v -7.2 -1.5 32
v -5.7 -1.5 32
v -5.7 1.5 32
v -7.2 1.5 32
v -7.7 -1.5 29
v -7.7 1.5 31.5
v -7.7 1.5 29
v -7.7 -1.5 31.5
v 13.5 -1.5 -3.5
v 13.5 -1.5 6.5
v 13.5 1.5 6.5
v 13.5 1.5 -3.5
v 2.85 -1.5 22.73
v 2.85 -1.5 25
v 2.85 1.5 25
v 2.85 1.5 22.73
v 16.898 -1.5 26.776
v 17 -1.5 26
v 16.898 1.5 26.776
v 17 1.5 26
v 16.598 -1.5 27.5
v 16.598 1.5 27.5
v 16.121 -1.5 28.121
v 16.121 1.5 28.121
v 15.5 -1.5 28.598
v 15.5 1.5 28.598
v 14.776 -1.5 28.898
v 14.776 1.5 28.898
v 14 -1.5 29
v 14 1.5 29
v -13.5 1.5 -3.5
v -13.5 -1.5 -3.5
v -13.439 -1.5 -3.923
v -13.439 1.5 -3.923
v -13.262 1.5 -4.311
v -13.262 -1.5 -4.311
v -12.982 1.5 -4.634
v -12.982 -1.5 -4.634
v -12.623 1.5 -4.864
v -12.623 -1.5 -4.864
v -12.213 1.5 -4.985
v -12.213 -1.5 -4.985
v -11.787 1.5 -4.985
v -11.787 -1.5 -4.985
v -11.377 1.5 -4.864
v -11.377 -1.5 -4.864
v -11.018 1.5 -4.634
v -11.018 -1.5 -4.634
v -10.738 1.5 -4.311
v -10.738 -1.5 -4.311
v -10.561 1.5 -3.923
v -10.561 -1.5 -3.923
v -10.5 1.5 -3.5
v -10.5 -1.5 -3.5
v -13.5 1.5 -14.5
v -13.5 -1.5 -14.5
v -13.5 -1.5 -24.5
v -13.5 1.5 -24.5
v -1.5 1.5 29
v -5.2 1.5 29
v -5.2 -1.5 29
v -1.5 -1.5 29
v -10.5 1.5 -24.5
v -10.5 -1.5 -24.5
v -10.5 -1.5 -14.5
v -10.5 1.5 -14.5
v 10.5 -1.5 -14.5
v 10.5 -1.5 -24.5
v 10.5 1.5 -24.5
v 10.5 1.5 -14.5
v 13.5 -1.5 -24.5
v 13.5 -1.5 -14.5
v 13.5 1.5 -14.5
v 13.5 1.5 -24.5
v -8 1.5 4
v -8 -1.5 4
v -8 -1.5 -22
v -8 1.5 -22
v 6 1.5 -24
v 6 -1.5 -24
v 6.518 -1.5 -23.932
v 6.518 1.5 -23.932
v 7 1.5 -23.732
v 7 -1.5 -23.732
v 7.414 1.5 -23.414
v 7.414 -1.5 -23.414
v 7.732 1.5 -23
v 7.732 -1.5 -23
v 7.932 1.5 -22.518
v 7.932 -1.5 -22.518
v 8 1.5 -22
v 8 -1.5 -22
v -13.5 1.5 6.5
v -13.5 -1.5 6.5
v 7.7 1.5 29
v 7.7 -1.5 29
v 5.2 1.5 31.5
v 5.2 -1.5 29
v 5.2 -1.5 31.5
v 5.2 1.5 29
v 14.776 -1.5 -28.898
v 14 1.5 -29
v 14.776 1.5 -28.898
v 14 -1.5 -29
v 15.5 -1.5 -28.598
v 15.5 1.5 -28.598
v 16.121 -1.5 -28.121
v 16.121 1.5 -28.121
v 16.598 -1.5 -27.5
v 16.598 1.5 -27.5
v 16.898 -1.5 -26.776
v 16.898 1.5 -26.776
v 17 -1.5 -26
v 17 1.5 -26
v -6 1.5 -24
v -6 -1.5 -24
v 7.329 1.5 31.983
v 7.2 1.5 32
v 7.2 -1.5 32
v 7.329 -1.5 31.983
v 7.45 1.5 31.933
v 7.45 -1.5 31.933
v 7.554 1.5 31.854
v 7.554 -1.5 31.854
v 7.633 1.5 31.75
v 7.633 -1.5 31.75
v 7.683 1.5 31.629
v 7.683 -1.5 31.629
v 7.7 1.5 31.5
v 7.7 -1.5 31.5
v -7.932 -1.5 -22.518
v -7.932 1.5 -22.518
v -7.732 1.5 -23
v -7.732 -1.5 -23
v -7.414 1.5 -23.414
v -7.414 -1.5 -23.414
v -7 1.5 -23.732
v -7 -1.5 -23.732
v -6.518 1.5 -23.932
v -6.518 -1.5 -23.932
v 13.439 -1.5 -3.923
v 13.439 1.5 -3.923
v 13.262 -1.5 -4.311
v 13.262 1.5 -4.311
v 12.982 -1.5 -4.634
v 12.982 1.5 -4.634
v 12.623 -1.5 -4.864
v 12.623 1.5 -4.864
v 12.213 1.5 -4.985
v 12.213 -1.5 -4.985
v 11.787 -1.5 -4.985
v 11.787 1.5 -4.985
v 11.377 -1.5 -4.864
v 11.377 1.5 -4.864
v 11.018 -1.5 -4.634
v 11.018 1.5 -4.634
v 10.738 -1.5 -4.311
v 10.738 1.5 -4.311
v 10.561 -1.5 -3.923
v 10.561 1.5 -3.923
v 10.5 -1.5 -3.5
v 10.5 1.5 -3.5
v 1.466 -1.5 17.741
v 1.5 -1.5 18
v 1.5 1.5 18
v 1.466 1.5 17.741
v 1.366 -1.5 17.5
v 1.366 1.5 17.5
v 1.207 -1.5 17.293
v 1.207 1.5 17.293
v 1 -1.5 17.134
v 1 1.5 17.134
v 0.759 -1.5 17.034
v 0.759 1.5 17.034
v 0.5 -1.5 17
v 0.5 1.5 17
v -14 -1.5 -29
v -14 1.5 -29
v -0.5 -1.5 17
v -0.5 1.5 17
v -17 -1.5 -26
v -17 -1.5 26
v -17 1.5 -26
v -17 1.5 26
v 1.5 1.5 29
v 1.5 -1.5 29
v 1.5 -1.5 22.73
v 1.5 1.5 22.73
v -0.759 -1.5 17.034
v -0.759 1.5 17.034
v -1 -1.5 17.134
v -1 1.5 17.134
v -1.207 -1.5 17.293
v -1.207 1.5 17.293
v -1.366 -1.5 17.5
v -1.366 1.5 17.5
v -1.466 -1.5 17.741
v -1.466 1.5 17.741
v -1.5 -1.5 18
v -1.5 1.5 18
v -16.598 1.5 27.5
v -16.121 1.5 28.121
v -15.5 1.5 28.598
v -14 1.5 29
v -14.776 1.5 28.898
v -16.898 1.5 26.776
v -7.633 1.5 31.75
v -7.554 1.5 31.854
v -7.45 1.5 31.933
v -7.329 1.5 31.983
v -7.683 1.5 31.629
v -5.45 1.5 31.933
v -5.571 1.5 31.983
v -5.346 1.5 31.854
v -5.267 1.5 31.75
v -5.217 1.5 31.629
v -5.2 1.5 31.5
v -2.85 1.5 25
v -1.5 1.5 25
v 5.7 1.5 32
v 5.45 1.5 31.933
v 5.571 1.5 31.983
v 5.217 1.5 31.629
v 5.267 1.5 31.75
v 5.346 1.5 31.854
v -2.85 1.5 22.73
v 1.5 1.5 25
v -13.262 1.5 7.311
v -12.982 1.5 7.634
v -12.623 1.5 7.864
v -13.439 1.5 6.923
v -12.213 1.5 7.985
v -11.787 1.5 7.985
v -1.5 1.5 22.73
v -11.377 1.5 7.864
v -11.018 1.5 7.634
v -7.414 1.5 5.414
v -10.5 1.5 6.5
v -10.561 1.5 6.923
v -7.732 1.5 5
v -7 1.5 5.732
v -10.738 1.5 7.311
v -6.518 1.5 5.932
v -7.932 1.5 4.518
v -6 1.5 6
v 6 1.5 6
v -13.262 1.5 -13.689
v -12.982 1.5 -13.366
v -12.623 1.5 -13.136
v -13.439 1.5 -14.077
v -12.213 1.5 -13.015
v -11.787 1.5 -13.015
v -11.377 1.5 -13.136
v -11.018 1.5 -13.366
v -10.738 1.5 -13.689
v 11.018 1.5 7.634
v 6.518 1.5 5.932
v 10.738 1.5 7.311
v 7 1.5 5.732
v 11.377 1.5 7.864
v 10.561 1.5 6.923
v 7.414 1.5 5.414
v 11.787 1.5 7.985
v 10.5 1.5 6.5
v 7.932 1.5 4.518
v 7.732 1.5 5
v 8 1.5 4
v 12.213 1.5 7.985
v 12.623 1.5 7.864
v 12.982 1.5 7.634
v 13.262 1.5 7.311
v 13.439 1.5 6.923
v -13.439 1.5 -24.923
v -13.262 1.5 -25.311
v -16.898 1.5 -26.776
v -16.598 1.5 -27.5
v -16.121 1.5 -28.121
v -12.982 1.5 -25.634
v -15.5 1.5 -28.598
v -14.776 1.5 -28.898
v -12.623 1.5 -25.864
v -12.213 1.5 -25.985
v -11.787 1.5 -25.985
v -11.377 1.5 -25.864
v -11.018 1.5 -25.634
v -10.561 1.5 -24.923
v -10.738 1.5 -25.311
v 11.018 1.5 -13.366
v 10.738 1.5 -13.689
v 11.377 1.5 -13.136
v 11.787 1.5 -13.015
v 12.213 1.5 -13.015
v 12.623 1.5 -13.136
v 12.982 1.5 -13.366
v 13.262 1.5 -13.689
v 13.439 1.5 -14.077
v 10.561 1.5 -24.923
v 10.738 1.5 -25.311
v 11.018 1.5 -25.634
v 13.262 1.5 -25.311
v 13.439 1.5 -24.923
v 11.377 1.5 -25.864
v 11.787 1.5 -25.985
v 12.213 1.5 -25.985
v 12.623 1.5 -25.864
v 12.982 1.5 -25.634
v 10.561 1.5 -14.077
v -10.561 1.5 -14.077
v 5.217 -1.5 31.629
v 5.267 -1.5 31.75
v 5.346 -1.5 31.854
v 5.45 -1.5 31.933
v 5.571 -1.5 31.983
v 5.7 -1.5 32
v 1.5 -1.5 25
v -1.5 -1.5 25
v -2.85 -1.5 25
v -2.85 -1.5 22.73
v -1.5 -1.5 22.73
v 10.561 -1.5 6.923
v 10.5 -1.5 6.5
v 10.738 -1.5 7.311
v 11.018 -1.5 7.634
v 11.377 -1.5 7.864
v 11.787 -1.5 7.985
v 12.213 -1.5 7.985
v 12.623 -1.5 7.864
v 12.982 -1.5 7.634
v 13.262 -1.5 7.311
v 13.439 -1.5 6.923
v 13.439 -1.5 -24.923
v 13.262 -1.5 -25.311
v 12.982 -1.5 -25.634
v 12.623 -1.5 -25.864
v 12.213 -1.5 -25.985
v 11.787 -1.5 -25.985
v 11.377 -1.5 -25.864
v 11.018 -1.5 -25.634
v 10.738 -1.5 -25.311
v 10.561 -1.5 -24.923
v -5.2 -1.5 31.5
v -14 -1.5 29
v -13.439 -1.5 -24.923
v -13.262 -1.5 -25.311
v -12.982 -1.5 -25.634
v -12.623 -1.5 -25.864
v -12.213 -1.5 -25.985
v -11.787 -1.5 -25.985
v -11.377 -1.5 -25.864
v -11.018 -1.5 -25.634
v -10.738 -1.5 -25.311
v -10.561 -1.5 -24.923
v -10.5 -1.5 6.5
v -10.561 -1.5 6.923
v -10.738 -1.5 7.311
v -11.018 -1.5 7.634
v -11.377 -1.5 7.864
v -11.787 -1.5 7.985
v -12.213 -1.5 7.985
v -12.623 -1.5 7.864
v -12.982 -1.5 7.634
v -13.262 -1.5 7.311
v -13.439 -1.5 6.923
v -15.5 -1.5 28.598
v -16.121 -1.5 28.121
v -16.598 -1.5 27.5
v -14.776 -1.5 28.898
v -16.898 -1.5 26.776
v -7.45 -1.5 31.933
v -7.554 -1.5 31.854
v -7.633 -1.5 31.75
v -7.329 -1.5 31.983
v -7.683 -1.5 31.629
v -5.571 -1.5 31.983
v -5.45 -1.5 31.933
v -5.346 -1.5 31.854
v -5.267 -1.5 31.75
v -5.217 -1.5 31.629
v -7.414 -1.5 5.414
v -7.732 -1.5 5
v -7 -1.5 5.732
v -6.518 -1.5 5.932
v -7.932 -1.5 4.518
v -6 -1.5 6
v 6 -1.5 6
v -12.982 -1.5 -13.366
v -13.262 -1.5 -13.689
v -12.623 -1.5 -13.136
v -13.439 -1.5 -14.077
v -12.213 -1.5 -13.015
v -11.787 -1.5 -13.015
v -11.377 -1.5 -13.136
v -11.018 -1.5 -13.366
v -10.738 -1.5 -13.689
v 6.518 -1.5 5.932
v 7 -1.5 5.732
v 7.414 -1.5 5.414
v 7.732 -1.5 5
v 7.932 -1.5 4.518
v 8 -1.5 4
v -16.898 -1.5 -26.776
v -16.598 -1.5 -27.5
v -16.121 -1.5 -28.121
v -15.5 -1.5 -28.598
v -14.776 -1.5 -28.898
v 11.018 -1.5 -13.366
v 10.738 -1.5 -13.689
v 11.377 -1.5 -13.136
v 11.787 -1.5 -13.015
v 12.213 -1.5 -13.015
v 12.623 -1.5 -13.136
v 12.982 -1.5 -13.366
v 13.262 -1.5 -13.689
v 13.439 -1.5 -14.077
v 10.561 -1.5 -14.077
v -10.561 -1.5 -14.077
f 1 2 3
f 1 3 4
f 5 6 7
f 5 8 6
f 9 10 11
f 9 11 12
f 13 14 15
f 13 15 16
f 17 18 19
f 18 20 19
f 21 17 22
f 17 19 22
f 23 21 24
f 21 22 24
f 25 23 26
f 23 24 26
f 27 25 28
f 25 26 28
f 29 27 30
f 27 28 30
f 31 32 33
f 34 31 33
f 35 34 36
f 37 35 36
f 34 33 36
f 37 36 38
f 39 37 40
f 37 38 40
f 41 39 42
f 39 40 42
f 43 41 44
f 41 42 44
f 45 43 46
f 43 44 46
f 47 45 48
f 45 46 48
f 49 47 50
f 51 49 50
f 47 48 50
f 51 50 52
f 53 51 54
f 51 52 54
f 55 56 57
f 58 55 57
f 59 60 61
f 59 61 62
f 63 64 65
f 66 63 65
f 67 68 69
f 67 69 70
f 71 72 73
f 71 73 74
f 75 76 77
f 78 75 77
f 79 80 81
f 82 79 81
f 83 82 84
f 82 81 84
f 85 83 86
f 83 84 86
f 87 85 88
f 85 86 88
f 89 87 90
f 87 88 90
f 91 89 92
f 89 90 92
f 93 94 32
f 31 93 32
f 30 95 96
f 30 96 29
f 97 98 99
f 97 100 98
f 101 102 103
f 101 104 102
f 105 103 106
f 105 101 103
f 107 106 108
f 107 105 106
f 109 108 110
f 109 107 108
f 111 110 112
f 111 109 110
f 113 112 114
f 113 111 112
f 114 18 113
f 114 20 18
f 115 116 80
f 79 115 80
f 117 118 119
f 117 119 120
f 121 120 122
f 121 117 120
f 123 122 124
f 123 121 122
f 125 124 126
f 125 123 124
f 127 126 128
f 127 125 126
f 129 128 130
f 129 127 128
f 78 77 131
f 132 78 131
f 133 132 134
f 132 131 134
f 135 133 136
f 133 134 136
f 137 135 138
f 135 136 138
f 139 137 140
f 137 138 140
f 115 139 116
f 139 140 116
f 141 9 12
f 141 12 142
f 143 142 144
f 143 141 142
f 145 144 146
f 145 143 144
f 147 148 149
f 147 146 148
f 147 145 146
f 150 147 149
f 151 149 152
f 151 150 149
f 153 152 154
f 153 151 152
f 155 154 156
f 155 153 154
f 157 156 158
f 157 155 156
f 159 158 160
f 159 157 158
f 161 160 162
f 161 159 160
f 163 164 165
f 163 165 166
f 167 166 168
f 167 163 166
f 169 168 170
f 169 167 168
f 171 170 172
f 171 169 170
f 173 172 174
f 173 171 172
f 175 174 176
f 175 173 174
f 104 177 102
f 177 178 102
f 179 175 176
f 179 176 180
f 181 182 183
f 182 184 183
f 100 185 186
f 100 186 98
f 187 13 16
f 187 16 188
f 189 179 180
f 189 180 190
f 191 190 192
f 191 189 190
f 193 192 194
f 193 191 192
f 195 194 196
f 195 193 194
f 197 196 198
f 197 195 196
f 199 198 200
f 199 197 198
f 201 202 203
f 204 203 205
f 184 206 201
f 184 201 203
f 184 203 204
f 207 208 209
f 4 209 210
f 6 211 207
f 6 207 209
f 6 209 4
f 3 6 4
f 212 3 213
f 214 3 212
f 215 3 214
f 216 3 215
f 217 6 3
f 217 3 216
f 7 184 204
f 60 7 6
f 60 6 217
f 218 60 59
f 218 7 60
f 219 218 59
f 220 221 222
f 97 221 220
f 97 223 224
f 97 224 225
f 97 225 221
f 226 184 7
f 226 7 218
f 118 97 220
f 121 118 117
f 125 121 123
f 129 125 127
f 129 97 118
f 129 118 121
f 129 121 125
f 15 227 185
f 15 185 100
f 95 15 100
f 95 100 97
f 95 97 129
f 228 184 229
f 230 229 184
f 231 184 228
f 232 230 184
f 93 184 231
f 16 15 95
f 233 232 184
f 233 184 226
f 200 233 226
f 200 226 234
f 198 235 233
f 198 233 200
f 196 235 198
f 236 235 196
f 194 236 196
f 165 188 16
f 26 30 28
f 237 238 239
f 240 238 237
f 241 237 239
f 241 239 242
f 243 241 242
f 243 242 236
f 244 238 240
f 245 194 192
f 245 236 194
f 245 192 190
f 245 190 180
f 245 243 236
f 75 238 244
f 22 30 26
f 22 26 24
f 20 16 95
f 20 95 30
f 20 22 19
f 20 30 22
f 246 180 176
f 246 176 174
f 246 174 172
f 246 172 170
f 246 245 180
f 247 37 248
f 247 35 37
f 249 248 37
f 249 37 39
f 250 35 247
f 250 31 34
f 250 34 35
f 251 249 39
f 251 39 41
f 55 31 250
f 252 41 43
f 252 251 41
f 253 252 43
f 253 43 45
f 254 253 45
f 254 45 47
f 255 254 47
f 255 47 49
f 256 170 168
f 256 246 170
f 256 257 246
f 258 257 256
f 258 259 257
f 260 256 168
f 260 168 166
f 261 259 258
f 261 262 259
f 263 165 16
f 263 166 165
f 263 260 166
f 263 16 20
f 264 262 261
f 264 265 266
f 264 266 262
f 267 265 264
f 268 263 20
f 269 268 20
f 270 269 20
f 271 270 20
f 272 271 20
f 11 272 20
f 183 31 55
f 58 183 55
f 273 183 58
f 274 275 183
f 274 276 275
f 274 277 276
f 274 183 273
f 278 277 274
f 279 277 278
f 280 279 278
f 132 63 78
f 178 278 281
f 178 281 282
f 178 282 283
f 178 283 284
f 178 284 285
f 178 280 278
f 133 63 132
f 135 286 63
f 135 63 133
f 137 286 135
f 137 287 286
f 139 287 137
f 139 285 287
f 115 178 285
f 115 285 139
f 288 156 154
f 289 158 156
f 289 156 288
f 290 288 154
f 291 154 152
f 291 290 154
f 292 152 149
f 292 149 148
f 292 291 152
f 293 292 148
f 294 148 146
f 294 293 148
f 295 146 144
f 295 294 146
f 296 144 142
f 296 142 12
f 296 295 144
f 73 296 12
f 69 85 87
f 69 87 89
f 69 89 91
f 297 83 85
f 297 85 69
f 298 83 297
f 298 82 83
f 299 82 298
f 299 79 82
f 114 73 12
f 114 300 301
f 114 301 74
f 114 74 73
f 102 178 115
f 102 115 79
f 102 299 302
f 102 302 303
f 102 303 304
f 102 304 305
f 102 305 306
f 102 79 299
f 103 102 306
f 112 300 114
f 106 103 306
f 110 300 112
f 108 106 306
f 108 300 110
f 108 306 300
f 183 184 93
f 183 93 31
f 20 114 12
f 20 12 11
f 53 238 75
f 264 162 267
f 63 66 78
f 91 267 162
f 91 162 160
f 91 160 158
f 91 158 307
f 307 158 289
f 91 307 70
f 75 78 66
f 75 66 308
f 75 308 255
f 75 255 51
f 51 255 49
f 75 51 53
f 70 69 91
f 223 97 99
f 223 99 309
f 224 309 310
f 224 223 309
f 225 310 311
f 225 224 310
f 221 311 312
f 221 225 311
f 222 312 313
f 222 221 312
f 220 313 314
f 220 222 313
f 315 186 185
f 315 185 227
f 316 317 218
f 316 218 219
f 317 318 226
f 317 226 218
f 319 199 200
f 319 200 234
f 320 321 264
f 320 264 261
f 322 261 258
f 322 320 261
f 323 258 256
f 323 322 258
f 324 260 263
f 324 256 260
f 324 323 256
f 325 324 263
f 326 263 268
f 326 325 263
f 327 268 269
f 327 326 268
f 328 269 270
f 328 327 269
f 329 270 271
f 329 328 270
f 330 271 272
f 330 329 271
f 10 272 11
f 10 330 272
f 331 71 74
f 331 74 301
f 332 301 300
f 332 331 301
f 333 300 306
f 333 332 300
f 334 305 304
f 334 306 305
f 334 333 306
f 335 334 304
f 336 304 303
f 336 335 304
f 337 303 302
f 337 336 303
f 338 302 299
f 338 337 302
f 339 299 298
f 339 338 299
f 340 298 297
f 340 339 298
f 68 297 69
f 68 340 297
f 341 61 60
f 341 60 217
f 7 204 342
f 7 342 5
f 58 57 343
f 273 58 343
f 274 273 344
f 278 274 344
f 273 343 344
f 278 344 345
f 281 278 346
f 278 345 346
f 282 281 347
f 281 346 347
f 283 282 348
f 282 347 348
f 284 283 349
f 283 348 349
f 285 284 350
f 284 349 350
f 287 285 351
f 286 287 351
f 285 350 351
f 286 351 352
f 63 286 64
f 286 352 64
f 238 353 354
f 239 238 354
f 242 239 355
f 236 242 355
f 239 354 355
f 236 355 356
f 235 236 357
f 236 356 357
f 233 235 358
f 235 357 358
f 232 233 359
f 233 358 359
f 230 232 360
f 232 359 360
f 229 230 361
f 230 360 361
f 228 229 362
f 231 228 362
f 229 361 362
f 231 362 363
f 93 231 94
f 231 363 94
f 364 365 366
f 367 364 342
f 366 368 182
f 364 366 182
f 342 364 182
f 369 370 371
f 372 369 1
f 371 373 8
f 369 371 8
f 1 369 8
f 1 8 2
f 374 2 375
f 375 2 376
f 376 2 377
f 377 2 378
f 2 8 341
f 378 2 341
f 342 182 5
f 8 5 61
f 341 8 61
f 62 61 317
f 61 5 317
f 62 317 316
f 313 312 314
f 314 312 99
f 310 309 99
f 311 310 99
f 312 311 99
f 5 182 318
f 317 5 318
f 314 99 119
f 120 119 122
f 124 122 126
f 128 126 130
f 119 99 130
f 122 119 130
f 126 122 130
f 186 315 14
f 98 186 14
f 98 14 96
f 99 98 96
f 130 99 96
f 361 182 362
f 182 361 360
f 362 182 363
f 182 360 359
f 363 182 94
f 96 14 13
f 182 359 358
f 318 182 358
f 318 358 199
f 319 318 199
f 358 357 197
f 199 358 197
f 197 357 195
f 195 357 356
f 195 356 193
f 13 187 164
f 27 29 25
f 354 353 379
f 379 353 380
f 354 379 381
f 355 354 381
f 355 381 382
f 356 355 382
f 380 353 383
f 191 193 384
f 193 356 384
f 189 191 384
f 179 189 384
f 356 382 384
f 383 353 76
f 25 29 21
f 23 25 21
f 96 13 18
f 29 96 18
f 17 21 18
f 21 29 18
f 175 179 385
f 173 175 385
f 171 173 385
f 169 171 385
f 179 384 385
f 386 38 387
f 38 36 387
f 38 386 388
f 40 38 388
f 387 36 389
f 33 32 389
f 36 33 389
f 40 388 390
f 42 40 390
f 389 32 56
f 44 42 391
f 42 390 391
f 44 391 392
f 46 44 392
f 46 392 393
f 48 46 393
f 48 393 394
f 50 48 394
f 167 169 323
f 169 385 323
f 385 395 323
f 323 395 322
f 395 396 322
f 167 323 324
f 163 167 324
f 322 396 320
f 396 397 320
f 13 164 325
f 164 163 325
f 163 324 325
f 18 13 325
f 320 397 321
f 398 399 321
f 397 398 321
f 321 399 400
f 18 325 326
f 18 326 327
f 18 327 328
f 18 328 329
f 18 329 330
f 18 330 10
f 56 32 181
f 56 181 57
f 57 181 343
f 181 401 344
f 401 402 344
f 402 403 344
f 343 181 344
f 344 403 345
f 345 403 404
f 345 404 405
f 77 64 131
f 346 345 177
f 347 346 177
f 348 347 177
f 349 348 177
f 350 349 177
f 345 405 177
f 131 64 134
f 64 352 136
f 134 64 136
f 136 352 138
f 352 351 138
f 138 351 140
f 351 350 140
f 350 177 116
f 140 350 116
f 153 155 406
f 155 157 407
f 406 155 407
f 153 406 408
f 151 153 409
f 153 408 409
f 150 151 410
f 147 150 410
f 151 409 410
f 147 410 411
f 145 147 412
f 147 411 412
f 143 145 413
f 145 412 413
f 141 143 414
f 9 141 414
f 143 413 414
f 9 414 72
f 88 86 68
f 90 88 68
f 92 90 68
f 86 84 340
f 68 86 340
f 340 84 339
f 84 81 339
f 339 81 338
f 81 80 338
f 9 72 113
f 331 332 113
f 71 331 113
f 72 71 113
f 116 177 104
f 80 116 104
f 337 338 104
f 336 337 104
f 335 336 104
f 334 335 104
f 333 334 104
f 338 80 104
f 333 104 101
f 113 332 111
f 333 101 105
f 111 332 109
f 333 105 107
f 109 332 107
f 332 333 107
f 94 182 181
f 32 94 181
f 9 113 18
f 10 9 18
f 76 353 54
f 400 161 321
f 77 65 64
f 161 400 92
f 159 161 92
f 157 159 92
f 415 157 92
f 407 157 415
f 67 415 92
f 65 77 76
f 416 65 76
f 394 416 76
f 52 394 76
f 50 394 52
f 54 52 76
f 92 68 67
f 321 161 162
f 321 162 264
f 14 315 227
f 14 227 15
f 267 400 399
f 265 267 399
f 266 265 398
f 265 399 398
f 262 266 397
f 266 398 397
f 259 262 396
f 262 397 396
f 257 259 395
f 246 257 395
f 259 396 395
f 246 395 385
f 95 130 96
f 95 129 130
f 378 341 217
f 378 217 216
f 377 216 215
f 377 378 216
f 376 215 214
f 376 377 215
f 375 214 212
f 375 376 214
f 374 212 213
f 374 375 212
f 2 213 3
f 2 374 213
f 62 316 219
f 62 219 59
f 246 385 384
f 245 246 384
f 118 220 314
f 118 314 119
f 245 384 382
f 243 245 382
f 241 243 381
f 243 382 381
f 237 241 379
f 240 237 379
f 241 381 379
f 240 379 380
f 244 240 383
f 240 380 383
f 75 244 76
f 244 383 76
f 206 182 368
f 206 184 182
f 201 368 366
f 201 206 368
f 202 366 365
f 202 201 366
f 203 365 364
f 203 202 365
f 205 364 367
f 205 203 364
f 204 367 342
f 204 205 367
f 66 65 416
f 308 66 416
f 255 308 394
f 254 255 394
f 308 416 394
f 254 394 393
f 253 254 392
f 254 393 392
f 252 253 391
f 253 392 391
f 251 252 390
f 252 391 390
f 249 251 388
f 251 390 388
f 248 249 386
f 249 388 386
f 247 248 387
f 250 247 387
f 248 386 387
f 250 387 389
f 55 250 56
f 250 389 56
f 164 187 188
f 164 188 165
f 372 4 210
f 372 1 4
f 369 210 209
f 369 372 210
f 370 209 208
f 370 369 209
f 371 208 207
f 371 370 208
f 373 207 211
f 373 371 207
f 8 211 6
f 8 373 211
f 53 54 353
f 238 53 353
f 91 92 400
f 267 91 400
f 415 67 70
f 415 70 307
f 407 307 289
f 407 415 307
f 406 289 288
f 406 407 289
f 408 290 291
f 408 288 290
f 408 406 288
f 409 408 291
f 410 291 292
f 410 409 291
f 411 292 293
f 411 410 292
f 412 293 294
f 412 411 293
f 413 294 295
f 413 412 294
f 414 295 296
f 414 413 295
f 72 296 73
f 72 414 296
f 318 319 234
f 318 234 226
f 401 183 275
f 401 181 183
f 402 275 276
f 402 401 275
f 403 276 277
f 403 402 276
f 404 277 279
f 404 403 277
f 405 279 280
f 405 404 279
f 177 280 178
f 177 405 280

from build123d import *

# Parameters (mm, degrees)
SKETCH1_W               = 34
SKETCH1_H               = 58
BOSS_EXTRUDE1_DEPTH     = 1.5
CUT_EXTRUDE1_DEPTH      = 34.648922717
CUT_EXTRUDE1_DEPTH_BACK = 34.648922717
CUT_EXTRUDE2_DEPTH      = 34.648922717
CUT_EXTRUDE2_DEPTH_BACK = 34.648922717
BOSS_EXTRUDE3_DEPTH     = 1.5
FILLET1_R               = 3


with BuildPart() as part:
    # Sketch1 → Boss-Extrude1 (new, symmetric)
    with BuildSketch(Plane(origin=(0, 0, 0), x_dir=(1, 0, 0), z_dir=(0, 1, 0))):
        Rectangle(SKETCH1_W, SKETCH1_H)
    extrude(amount=BOSS_EXTRUDE1_DEPTH, both=True)

    # Sketch3 → Cut-Extrude1 (cut, two sides: drawn at the far end of the back side and taken through both)
    with BuildSketch(Plane(origin=(0, 0, 0), x_dir=(1, 0, 0), z_dir=(0, 1, 0)).offset(-CUT_EXTRUDE1_DEPTH_BACK)):
        with BuildLine():
            Line((-13.5, 14.5), (-13.5, 24.5))
            ThreePointArc((-13.5, 24.5), (-12, 26), (-10.5, 24.5))
            Line((-10.5, 24.5), (-10.5, 14.5))
            ThreePointArc((-10.5, 14.5), (-12, 13), (-13.5, 14.5))
        make_face()
        with BuildLine():
            Line((-13.5, -6.5), (-13.5, 3.5))
            ThreePointArc((-13.5, 3.5), (-12, 5), (-10.5, 3.5))
            Line((-10.5, 3.5), (-10.5, -6.5))
            ThreePointArc((-10.5, -6.5), (-12, -8), (-13.5, -6.5))
        make_face()
        with BuildLine():
            Line((13.5, -6.5), (13.5, 3.5))
            ThreePointArc((13.5, 3.5), (12, 5), (10.5, 3.5))
            Line((10.5, 3.5), (10.5, -6.5))
            ThreePointArc((10.5, -6.5), (12, -8), (13.5, -6.5))
        make_face()
        with BuildLine():
            Line((13.5, 14.5), (13.5, 24.5))
            ThreePointArc((13.5, 24.5), (12, 26), (10.5, 24.5))
            Line((10.5, 24.5), (10.5, 14.5))
            ThreePointArc((10.5, 14.5), (12, 13), (13.5, 14.5))
        make_face()
        with BuildLine():
            Line((-6, 24), (6, 24))
            ThreePointArc((6, 24), (7.414213562, 23.414213562), (8, 22))
            Line((8, 22), (8, -4))
            ThreePointArc((8, -4), (7.414213562, -5.414213562), (6, -6))
            Line((6, -6), (-6, -6))
            ThreePointArc((-6, -6), (-7.414213562, -5.414213562), (-8, -4))
            Line((-8, -4), (-8, 22))
            ThreePointArc((-8, 22), (-7.414213562, 23.414213562), (-6, 24))
        make_face()
    extrude(amount=CUT_EXTRUDE1_DEPTH + CUT_EXTRUDE1_DEPTH_BACK, mode=Mode.SUBTRACT)

    # Sketch5 → Cut-Extrude2 (cut, two sides: drawn at the far end of the back side and taken through both)
    with BuildSketch(Plane(origin=(0, 0, 0), x_dir=(1, 0, 0), z_dir=(0, 1, 0)).offset(-CUT_EXTRUDE2_DEPTH_BACK)):
        with BuildLine():
            Line((-1.5, -29), (1.5, -29))
            Line((1.5, -29), (1.5, -25))
            Line((1.5, -25), (2.85, -25))
            Line((2.85, -25), (2.85, -22.73))
            Line((2.85, -22.73), (1.5, -22.73))
            Line((1.5, -22.73), (1.5, -18))
            ThreePointArc((1.5, -18), (1.207106781, -17.292893219), (0.5, -17))
            Line((0.5, -17), (-0.5, -17))
            ThreePointArc((-0.5, -17), (-1.207106781, -17.292893219), (-1.5, -18))
            Line((-1.5, -18), (-1.5, -22.73))
            Line((-1.5, -22.73), (-2.85, -22.73))
            Line((-2.85, -22.73), (-2.85, -25))
            Line((-2.85, -25), (-1.5, -25))
            Line((-1.5, -25), (-1.5, -29))
        make_face()
    extrude(amount=CUT_EXTRUDE2_DEPTH + CUT_EXTRUDE2_DEPTH_BACK, mode=Mode.SUBTRACT)

    # Sketch8 → Boss-Extrude3 (add, symmetric)
    with BuildSketch(Plane(origin=(0, 0, 0), x_dir=(1, 0, 0), z_dir=(0, 1, 0))):
        with BuildLine():
            Line((-7.7, -29), (-5.2, -29))
            Line((-5.2, -29), (-5.2, -31.5))
            ThreePointArc((-5.2, -31.5), (-5.346446609, -31.853553391), (-5.7, -32))
            Line((-5.7, -32), (-7.2, -32))
            ThreePointArc((-7.2, -32), (-7.553553391, -31.853553391), (-7.7, -31.5))
            Line((-7.7, -31.5), (-7.7, -29))
        make_face()
        with BuildLine():
            Line((5.2, -29), (5.2, -31.5))
            ThreePointArc((5.2, -31.5), (5.346446609, -31.853553391), (5.7, -32))
            Line((5.7, -32), (7.2, -32))
            ThreePointArc((7.2, -32), (7.553553391, -31.853553391), (7.7, -31.5))
            Line((7.7, -31.5), (7.7, -29))
            Line((7.7, -29), (5.2, -29))
        make_face()
    extrude(amount=BOSS_EXTRUDE3_DEPTH, both=True)

    # Fillet1
    fillet1_edges = [part.edges().sort_by_distance(p)[0] for p in [
        (-17, 0, -29),
        (17, 0, -29),
        (17, 0, 29),
        (-17, 0, 29),
    ]]
    fillet(fillet1_edges, radius=FILLET1_R)


solid = part.part
